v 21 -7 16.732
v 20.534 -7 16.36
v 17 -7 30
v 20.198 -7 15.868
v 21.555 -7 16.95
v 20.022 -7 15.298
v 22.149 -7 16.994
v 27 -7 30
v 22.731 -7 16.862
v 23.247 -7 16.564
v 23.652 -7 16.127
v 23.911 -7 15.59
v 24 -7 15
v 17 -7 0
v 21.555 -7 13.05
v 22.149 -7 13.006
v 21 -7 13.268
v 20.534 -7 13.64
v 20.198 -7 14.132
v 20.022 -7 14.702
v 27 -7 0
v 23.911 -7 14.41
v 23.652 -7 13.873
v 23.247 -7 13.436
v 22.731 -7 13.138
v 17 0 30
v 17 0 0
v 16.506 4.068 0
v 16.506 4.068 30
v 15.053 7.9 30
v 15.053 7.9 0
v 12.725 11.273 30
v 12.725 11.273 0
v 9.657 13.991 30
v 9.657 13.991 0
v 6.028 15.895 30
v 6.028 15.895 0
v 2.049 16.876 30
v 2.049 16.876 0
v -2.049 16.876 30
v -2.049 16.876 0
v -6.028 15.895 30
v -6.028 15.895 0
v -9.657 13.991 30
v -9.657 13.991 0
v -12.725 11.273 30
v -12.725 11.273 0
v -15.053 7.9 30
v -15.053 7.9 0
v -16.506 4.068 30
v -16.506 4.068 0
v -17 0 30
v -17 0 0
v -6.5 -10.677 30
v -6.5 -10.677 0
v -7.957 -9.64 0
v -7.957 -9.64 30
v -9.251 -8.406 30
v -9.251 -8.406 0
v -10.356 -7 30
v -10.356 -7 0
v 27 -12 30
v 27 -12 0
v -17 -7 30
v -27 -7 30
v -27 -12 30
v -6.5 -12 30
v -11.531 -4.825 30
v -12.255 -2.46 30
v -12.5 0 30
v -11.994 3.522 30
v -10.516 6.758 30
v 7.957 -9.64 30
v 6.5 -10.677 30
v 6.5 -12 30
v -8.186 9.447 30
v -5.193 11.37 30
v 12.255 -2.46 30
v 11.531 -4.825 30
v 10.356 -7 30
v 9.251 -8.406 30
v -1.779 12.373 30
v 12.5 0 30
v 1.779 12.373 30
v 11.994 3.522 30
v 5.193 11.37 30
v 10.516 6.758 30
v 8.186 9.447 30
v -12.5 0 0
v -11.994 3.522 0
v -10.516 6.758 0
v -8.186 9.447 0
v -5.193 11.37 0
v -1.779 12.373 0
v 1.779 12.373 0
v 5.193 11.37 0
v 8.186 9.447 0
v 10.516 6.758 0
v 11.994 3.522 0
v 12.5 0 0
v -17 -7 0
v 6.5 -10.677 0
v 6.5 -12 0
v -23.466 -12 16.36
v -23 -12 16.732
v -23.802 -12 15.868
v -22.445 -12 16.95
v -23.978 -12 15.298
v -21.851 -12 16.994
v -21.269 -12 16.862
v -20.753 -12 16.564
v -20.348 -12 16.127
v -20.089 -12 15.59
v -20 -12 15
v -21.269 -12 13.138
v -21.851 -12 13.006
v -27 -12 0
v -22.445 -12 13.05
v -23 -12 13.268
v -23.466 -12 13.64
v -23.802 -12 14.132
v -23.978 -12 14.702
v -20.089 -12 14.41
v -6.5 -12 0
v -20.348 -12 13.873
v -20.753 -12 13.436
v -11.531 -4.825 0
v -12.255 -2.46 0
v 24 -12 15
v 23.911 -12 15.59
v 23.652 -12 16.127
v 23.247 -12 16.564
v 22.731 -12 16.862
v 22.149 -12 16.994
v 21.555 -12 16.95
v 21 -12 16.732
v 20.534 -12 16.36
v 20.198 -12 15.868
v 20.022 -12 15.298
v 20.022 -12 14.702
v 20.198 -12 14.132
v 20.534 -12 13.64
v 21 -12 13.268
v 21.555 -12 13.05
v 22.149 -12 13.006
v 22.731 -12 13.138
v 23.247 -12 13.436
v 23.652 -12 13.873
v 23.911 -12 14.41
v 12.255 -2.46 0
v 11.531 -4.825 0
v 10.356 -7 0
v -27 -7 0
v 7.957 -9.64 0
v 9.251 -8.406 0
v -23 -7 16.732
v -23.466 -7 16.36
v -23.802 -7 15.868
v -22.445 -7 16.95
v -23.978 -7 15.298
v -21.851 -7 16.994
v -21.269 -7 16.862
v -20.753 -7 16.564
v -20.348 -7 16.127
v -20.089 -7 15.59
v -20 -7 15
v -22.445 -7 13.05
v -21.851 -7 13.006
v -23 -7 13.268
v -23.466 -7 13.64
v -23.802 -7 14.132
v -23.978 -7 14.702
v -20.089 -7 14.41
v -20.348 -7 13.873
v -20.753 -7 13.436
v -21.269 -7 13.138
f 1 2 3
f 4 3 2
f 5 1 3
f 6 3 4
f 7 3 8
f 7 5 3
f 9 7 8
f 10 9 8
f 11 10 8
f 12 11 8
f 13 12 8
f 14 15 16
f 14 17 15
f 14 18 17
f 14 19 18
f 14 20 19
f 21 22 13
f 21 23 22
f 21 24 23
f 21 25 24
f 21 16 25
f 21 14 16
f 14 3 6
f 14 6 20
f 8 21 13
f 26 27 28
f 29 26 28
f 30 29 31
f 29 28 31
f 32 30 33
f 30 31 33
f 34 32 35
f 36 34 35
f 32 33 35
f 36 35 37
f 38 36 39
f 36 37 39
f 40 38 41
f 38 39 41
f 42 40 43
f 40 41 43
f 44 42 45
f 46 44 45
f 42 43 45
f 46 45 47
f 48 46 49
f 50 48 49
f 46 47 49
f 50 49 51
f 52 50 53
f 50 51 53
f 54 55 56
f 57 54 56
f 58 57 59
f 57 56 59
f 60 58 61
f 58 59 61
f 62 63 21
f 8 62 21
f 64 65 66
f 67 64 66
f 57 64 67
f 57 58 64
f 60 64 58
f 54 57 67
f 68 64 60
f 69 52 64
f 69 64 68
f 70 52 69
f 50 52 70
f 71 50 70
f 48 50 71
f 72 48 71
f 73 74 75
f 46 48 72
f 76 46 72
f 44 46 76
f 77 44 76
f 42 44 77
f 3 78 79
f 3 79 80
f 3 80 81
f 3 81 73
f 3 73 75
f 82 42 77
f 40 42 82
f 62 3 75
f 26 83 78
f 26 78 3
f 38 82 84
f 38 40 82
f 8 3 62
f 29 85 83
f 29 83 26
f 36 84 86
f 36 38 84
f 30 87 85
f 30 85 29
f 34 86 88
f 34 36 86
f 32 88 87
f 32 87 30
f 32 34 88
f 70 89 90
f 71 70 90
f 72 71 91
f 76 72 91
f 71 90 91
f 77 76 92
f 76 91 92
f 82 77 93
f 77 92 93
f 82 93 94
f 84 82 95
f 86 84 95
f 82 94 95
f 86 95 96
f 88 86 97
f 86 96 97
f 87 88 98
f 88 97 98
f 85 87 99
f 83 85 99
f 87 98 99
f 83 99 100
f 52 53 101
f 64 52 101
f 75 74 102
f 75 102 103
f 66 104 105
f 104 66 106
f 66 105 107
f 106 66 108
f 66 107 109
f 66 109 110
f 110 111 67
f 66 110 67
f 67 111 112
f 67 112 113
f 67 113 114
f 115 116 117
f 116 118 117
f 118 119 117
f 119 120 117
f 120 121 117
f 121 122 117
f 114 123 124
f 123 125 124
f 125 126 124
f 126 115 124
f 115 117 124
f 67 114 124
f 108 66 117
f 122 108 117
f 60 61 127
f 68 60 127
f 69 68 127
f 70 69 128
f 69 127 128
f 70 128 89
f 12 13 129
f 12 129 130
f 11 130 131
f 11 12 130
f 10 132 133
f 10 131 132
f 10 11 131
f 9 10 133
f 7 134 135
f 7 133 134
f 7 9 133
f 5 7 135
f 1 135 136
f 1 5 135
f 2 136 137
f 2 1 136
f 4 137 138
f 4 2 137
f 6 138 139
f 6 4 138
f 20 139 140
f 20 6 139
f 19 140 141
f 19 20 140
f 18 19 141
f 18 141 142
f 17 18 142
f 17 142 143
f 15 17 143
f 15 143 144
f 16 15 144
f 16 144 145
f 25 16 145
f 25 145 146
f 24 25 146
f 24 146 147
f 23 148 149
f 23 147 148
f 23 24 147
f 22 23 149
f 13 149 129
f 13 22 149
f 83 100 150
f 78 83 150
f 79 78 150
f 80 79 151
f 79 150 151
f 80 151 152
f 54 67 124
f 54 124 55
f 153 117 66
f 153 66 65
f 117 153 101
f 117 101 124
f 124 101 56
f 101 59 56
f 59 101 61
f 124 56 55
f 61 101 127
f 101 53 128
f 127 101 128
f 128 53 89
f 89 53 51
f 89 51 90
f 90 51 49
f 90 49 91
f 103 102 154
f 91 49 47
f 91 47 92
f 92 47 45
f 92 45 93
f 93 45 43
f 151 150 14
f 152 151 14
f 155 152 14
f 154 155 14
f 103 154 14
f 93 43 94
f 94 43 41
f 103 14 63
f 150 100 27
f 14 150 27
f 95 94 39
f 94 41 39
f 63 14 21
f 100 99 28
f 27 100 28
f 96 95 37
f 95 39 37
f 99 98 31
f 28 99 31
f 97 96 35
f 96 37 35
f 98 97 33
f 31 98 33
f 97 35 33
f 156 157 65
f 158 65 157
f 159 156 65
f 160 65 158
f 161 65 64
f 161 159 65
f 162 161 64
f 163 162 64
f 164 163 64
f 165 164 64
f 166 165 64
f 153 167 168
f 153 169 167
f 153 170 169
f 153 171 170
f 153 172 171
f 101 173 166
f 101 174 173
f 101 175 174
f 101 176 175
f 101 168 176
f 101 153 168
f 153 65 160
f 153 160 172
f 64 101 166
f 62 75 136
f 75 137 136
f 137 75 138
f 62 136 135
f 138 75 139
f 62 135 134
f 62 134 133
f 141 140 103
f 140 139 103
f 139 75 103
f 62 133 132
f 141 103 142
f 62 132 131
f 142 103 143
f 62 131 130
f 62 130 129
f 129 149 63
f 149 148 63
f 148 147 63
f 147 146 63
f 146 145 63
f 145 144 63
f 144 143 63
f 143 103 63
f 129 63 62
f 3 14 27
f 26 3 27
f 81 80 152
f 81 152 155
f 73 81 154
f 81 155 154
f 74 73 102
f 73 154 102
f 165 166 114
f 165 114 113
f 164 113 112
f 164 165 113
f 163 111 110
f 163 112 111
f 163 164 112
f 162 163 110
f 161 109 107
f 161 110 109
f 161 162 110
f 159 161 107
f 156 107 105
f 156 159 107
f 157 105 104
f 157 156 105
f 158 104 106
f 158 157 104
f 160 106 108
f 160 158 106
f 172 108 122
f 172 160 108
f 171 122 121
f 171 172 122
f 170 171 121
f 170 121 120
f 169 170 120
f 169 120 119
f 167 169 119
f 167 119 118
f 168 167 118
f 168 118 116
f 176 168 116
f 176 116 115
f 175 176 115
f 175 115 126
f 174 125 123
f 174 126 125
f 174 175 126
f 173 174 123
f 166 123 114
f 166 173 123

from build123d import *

# Parameters (mm, degrees)
F0_W      = 10
F0_H      = 5
F1_DEPTH  = 30
F2_R      = 2
F1_FACE_W = 20.5
F1_FACE_H = 30
F3_DEPTH  = 25


with BuildPart() as f1:
    # F0 (on Top) → F1 (new body)
    with BuildSketch(Plane.XY):
        with Locations((-22, -9.5)):
            Rectangle(F0_W, F0_H)
        with Locations((22, -9.5)):
            Rectangle(F0_W, F0_H)
        with BuildLine():
            ThreePointArc((-15.4919333848, -7), (-16.6187073436, -3.5803025332), (-17, 0))
            Line((-17, 0), (-17, -7))
            Line((-17, -7), (-15.4919333848, -7))
        make_face()
        with BuildLine():
            Line((17, -7), (17, 0))
            ThreePointArc((17, 0), (16.6187073436, -3.5803025332), (15.4919333848, -7))
            Line((15.4919333848, -7), (17, -7))
        make_face()
        with BuildLine():
            Line((12.5, 0), (17, 0))
            ThreePointArc((17, 0), (0, 17), (-17, 0))
            Line((-17, 0), (-12.5, 0))
            ThreePointArc((-12.5, 0), (0, 12.5), (12.5, 0))
        make_face()
        with BuildLine():
            Line((-12.5, 0), (-17, 0))
            ThreePointArc((-17, 0), (-16.6187073436, -3.5803025332), (-15.4919333848, -7))
            Line((-15.4919333848, -7), (-10.3561575886, -7))
            ThreePointArc((-10.3561575886, -7), (-11.9520284859, -3.6604665101), (-12.5, 0))
        make_face()
        with BuildLine():
            ThreePointArc((-12.0415945788, -12), (-13.991918758, -9.6553720523), (-15.4919333848, -7))
            Line((-15.4919333848, -7), (-17, -7))
            Line((-17, -7), (-17, -12))
            Line((-17, -12), (-12.0415945788, -12))
        make_face()
        with BuildLine():
            Line((17, -7), (15.4919333848, -7))
            ThreePointArc((15.4919333848, -7), (13.991918758, -9.6553720523), (12.0415945788, -12))
            Line((12.0415945788, -12), (17, -12))
            Line((17, -12), (17, -7))
        make_face()
        with BuildLine():
            ThreePointArc((15.4919333848, -7), (16.6187073436, -3.5803025332), (17, 0))
            Line((17, 0), (12.5, 0))
            ThreePointArc((12.5, 0), (11.9520284859, -3.6604665101), (10.3561575886, -7))
            Line((10.3561575886, -7), (15.4919333848, -7))
        make_face()
        with BuildLine():
            Line((-10.3561575886, -7), (-15.4919333848, -7))
            ThreePointArc((-15.4919333848, -7), (-13.991918758, -9.6553720523), (-12.0415945788, -12))
            Line((-12.0415945788, -12), (-6.5, -12))
            Line((-6.5, -12), (-6.5, -10.677078252))
            ThreePointArc((-6.5, -10.677078252), (-8.6262818341, -9.0463949571), (-10.3561575886, -7))
        make_face()
        with BuildLine():
            ThreePointArc((12.0415945788, -12), (13.991918758, -9.6553720523), (15.4919333848, -7))
            Line((15.4919333848, -7), (10.3561575886, -7))
            ThreePointArc((10.3561575886, -7), (8.6262818341, -9.0463949571), (6.5, -10.677078252))
            Line((6.5, -10.677078252), (6.5, -12))
            Line((6.5, -12), (12.0415945788, -12))
        make_face()
    extrude(amount=F1_DEPTH)

    # F2 (on Front) + F1_face (on face) → F3 (cut)
    with BuildSketch(Plane.XZ):
        with Locations((-22, 15)):
            Circle(F2_R)
        with Locations((22, 15)):
            Circle(F2_R)
    with BuildSketch(Plane(origin=(-16.75, -12, 15), x_dir=(1, 0, 0), z_dir=(0, -1, 0))):
        Rectangle(F1_FACE_W, F1_FACE_H)
        with Locations((33.5, 0)):
            Rectangle(F1_FACE_W, F1_FACE_H)
    extrude(amount=F3_DEPTH, mode=Mode.SUBTRACT)


solid = f1.part
